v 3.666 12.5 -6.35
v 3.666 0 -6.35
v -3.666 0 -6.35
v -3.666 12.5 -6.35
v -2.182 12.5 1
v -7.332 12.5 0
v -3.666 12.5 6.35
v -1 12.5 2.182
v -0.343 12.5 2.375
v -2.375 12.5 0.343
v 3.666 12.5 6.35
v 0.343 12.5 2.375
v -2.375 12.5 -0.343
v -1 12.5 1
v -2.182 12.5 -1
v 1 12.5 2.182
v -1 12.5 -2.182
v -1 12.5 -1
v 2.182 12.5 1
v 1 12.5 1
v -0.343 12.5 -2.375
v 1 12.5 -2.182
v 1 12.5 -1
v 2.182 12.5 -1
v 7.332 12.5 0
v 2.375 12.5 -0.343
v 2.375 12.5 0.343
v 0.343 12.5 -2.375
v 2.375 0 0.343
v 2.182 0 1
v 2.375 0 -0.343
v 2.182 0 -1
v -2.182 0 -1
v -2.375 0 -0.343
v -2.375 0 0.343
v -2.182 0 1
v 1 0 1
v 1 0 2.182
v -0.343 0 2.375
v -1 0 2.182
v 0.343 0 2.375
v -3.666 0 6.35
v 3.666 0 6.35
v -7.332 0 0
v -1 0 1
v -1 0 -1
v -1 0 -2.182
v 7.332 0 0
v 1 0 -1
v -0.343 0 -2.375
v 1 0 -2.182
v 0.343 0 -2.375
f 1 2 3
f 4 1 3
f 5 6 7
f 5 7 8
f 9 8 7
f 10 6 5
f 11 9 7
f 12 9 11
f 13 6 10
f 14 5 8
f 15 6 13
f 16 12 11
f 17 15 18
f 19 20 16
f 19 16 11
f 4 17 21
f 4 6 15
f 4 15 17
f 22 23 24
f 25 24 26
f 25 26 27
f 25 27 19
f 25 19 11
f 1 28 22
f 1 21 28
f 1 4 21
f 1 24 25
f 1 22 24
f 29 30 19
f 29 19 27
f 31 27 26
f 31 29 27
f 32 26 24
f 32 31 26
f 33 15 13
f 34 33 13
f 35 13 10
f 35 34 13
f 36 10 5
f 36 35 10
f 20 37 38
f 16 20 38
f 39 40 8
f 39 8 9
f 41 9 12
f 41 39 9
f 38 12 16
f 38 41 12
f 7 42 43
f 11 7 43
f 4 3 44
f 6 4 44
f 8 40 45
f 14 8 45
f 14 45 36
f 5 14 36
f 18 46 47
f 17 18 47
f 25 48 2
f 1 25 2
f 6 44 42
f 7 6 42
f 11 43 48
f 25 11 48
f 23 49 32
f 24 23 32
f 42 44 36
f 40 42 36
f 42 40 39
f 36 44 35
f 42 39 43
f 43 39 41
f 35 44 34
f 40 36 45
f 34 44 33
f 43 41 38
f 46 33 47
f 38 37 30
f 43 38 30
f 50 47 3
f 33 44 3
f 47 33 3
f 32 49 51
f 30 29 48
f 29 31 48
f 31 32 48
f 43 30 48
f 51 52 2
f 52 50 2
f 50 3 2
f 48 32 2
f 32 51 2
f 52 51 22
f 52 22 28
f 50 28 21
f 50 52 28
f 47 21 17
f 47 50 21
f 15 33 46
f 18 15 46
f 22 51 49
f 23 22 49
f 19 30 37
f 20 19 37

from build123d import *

# Parameters (mm, degrees)
SKETCH1_R           = 2.4
BOSS_EXTRUDE1_DEPTH = 12.5


with BuildPart() as part:
    # Sketch1 → Boss-Extrude1 (new body)
    # profile 1 of 5: a face of its own
    with BuildSketch(Plane(origin=(0, 0, 0), x_dir=(1, 0, 0), z_dir=(0, 1, 0))):
        Polygon((-3.666174209, -6.35), (3.666174209, -6.35), (7.332348419, 0), (3.666174209, 6.35), (-3.666174209, 6.35), (-7.332348419, 0), align=None)
        Circle(SKETCH1_R, mode=Mode.SUBTRACT)
    # profile 2 of 5: a face of its own
    with BuildSketch(Plane(origin=(0, 0, 0), x_dir=(1, 0, 0), z_dir=(0, 1, 0))):
        with BuildLine():
            Line((-2.181742423, 1), (-1, 1))
            Line((-1, 1), (-1, 2.181742423))
            ThreePointArc((-1, 2.181742423), (-1.697056275, 1.697056275), (-2.181742423, 1))
        make_face()
    # profile 3 of 5: a face of its own
    with BuildSketch(Plane(origin=(0, 0, 0), x_dir=(1, 0, 0), z_dir=(0, 1, 0))):
        with BuildLine():
            Line((-1, -2.181742423), (-1, -1))
            Line((-1, -1), (-2.181742423, -1))
            ThreePointArc((-2.181742423, -1), (-1.697056275, -1.697056275), (-1, -2.181742423))
        make_face()
    # profile 4 of 5: a face of its own
    with BuildSketch(Plane(origin=(0, 0, 0), x_dir=(1, 0, 0), z_dir=(0, 1, 0))):
        with BuildLine():
            Line((2.181742423, -1), (1, -1))
            Line((1, -1), (1, -2.181742423))
            ThreePointArc((1, -2.181742423), (1.697056275, -1.697056275), (2.181742423, -1))
        make_face()
    # profile 5 of 5: a face of its own
    with BuildSketch(Plane(origin=(0, 0, 0), x_dir=(1, 0, 0), z_dir=(0, 1, 0))):
        with BuildLine():
            Line((1, 2.181742423), (1, 1))
            Line((1, 1), (2.181742423, 1))
            ThreePointArc((2.181742423, 1), (1.697056275, 1.697056275), (1, 2.181742423))
        make_face()
    extrude(amount=BOSS_EXTRUDE1_DEPTH)


solid = part.part
